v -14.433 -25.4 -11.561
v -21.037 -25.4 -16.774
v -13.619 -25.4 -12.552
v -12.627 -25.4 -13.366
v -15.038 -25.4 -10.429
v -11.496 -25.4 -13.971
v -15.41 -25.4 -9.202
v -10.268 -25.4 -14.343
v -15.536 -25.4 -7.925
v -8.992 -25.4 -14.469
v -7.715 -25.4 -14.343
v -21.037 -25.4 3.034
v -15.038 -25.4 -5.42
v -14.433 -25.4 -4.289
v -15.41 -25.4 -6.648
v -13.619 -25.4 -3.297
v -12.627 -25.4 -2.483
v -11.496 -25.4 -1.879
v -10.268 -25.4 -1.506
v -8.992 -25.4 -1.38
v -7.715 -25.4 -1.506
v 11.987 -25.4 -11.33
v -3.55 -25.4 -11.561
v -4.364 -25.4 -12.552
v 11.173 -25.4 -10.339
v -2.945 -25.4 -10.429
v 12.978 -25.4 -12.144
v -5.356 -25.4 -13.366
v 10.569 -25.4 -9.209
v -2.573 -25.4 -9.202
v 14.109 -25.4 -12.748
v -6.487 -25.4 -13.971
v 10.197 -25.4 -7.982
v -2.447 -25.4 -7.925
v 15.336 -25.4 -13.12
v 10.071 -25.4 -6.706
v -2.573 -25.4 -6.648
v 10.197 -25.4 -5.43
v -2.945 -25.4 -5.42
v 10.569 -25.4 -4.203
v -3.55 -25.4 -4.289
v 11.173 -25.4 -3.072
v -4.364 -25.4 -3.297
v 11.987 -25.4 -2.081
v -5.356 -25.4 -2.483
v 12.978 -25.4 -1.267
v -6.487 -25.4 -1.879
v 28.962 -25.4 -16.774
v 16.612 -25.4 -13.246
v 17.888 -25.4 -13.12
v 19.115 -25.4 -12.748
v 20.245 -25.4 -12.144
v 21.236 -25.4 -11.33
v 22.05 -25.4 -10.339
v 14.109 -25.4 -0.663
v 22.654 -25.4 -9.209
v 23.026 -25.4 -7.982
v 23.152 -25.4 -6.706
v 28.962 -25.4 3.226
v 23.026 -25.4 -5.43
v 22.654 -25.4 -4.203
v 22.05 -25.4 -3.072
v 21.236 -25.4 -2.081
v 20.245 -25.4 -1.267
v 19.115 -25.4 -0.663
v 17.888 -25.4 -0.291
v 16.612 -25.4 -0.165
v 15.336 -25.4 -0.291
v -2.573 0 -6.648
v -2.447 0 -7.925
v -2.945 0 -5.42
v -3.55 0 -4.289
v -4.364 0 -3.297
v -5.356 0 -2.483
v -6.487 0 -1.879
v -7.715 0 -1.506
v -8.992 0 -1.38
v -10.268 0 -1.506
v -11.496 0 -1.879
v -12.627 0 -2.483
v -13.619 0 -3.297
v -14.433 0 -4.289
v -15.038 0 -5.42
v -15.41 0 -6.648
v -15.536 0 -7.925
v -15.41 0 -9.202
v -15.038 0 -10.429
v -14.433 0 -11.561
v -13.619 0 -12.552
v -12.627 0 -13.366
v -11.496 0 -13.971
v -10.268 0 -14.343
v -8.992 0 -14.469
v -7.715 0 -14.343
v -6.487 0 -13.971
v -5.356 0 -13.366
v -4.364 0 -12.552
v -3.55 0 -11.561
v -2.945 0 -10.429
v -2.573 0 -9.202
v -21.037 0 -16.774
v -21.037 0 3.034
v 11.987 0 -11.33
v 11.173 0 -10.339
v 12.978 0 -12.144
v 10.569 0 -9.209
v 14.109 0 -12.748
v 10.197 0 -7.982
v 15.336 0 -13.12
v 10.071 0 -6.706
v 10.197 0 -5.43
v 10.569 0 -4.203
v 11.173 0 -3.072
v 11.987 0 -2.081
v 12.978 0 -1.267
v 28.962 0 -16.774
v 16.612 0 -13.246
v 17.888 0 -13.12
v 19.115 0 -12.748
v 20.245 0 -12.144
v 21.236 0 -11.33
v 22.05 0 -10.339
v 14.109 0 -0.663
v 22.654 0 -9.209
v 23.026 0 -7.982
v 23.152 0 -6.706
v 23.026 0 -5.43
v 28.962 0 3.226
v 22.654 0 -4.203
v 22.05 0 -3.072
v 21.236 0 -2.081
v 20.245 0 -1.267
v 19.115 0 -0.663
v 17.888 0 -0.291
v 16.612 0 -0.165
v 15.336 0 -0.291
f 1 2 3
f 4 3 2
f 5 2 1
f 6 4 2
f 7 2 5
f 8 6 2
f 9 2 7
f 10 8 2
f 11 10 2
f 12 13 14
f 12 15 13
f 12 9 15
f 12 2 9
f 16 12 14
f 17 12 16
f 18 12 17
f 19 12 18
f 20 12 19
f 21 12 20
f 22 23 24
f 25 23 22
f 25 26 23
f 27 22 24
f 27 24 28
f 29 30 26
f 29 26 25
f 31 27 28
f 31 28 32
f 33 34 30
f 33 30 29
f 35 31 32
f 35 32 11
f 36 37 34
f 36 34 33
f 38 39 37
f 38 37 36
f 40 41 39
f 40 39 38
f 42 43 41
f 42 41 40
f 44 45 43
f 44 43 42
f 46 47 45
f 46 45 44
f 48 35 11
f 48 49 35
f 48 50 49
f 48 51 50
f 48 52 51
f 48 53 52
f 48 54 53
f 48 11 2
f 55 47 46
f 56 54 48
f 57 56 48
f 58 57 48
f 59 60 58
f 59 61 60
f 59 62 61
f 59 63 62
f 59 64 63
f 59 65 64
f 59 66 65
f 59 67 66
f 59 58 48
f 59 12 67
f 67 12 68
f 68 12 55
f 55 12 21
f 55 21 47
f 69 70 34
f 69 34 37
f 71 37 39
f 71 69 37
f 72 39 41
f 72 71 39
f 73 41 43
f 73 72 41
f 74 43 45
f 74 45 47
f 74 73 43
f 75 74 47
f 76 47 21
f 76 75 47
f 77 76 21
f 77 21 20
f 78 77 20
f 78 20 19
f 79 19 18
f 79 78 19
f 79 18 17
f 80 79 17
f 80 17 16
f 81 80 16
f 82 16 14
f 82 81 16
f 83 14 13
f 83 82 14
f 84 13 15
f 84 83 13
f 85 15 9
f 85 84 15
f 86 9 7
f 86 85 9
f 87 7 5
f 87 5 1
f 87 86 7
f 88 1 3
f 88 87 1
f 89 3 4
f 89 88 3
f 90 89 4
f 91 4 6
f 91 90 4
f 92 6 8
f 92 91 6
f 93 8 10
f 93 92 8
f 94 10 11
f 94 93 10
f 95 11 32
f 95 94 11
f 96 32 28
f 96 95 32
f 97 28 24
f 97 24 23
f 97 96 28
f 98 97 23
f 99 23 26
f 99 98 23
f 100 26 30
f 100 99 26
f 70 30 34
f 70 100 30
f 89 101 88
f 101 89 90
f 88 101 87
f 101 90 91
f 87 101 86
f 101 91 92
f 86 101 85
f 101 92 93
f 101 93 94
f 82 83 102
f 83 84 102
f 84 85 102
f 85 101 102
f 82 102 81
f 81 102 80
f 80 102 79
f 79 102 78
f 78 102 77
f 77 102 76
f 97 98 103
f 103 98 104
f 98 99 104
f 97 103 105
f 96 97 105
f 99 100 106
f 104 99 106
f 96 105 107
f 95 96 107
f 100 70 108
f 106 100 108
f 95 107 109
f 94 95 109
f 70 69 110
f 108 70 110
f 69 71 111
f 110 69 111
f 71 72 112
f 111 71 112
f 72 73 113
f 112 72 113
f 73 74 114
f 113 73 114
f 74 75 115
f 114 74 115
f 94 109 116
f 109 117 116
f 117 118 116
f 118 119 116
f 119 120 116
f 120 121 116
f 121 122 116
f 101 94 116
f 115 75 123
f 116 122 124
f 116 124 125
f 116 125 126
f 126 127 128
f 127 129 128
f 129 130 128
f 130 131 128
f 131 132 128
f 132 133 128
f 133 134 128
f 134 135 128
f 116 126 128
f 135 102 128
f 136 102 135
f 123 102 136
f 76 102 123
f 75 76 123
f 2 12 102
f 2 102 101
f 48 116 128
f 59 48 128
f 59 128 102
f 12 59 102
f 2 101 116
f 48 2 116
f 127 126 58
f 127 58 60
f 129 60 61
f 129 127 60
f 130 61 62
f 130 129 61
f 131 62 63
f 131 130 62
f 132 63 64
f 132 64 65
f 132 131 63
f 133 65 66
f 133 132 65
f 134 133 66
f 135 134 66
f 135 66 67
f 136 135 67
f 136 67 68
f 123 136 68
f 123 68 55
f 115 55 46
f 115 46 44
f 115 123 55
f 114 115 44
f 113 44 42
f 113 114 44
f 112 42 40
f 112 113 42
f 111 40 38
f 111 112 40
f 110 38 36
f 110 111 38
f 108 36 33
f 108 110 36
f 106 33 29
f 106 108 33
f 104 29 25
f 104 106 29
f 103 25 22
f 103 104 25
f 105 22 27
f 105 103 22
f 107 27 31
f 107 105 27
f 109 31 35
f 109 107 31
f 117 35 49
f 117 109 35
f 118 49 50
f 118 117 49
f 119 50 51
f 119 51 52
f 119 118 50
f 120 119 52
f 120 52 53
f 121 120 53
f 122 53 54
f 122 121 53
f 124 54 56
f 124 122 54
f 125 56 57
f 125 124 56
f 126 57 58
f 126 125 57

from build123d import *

# Parameters (mm, degrees)
F0_R     = 6.544333
F0_R_2   = 6.5405
F1_DEPTH = 25.4
F2_DEPTH = 25.4


with BuildPart() as f1:
    # F0 (on Front) → F1 (new body)
    with BuildSketch(Plane.XZ):
        Polygon((28.962216, 3.225733), (-21.037417, 3.034164), (-21.037417, -16.774267), (28.962216, -16.774267), align=None)
        with Locations((-8.991601, -7.9248)):
            Circle(F0_R, mode=Mode.SUBTRACT)
        with Locations((16.611602, -6.7056)):
            Circle(F0_R_2, mode=Mode.SUBTRACT)
    extrude(amount=F1_DEPTH)

    # F0 (on Front) → F2 (join)
    with BuildSketch(Plane.XZ):
        Polygon((28.962216, 3.225733), (-21.037417, 3.034164), (-21.037417, -16.774267), (28.962216, -16.774267), align=None)
        with Locations((-8.991601, -7.9248)):
            Circle(F0_R, mode=Mode.SUBTRACT)
        with Locations((16.611602, -6.7056)):
            Circle(F0_R_2, mode=Mode.SUBTRACT)
    extrude(amount=F2_DEPTH)


solid = f1.part
